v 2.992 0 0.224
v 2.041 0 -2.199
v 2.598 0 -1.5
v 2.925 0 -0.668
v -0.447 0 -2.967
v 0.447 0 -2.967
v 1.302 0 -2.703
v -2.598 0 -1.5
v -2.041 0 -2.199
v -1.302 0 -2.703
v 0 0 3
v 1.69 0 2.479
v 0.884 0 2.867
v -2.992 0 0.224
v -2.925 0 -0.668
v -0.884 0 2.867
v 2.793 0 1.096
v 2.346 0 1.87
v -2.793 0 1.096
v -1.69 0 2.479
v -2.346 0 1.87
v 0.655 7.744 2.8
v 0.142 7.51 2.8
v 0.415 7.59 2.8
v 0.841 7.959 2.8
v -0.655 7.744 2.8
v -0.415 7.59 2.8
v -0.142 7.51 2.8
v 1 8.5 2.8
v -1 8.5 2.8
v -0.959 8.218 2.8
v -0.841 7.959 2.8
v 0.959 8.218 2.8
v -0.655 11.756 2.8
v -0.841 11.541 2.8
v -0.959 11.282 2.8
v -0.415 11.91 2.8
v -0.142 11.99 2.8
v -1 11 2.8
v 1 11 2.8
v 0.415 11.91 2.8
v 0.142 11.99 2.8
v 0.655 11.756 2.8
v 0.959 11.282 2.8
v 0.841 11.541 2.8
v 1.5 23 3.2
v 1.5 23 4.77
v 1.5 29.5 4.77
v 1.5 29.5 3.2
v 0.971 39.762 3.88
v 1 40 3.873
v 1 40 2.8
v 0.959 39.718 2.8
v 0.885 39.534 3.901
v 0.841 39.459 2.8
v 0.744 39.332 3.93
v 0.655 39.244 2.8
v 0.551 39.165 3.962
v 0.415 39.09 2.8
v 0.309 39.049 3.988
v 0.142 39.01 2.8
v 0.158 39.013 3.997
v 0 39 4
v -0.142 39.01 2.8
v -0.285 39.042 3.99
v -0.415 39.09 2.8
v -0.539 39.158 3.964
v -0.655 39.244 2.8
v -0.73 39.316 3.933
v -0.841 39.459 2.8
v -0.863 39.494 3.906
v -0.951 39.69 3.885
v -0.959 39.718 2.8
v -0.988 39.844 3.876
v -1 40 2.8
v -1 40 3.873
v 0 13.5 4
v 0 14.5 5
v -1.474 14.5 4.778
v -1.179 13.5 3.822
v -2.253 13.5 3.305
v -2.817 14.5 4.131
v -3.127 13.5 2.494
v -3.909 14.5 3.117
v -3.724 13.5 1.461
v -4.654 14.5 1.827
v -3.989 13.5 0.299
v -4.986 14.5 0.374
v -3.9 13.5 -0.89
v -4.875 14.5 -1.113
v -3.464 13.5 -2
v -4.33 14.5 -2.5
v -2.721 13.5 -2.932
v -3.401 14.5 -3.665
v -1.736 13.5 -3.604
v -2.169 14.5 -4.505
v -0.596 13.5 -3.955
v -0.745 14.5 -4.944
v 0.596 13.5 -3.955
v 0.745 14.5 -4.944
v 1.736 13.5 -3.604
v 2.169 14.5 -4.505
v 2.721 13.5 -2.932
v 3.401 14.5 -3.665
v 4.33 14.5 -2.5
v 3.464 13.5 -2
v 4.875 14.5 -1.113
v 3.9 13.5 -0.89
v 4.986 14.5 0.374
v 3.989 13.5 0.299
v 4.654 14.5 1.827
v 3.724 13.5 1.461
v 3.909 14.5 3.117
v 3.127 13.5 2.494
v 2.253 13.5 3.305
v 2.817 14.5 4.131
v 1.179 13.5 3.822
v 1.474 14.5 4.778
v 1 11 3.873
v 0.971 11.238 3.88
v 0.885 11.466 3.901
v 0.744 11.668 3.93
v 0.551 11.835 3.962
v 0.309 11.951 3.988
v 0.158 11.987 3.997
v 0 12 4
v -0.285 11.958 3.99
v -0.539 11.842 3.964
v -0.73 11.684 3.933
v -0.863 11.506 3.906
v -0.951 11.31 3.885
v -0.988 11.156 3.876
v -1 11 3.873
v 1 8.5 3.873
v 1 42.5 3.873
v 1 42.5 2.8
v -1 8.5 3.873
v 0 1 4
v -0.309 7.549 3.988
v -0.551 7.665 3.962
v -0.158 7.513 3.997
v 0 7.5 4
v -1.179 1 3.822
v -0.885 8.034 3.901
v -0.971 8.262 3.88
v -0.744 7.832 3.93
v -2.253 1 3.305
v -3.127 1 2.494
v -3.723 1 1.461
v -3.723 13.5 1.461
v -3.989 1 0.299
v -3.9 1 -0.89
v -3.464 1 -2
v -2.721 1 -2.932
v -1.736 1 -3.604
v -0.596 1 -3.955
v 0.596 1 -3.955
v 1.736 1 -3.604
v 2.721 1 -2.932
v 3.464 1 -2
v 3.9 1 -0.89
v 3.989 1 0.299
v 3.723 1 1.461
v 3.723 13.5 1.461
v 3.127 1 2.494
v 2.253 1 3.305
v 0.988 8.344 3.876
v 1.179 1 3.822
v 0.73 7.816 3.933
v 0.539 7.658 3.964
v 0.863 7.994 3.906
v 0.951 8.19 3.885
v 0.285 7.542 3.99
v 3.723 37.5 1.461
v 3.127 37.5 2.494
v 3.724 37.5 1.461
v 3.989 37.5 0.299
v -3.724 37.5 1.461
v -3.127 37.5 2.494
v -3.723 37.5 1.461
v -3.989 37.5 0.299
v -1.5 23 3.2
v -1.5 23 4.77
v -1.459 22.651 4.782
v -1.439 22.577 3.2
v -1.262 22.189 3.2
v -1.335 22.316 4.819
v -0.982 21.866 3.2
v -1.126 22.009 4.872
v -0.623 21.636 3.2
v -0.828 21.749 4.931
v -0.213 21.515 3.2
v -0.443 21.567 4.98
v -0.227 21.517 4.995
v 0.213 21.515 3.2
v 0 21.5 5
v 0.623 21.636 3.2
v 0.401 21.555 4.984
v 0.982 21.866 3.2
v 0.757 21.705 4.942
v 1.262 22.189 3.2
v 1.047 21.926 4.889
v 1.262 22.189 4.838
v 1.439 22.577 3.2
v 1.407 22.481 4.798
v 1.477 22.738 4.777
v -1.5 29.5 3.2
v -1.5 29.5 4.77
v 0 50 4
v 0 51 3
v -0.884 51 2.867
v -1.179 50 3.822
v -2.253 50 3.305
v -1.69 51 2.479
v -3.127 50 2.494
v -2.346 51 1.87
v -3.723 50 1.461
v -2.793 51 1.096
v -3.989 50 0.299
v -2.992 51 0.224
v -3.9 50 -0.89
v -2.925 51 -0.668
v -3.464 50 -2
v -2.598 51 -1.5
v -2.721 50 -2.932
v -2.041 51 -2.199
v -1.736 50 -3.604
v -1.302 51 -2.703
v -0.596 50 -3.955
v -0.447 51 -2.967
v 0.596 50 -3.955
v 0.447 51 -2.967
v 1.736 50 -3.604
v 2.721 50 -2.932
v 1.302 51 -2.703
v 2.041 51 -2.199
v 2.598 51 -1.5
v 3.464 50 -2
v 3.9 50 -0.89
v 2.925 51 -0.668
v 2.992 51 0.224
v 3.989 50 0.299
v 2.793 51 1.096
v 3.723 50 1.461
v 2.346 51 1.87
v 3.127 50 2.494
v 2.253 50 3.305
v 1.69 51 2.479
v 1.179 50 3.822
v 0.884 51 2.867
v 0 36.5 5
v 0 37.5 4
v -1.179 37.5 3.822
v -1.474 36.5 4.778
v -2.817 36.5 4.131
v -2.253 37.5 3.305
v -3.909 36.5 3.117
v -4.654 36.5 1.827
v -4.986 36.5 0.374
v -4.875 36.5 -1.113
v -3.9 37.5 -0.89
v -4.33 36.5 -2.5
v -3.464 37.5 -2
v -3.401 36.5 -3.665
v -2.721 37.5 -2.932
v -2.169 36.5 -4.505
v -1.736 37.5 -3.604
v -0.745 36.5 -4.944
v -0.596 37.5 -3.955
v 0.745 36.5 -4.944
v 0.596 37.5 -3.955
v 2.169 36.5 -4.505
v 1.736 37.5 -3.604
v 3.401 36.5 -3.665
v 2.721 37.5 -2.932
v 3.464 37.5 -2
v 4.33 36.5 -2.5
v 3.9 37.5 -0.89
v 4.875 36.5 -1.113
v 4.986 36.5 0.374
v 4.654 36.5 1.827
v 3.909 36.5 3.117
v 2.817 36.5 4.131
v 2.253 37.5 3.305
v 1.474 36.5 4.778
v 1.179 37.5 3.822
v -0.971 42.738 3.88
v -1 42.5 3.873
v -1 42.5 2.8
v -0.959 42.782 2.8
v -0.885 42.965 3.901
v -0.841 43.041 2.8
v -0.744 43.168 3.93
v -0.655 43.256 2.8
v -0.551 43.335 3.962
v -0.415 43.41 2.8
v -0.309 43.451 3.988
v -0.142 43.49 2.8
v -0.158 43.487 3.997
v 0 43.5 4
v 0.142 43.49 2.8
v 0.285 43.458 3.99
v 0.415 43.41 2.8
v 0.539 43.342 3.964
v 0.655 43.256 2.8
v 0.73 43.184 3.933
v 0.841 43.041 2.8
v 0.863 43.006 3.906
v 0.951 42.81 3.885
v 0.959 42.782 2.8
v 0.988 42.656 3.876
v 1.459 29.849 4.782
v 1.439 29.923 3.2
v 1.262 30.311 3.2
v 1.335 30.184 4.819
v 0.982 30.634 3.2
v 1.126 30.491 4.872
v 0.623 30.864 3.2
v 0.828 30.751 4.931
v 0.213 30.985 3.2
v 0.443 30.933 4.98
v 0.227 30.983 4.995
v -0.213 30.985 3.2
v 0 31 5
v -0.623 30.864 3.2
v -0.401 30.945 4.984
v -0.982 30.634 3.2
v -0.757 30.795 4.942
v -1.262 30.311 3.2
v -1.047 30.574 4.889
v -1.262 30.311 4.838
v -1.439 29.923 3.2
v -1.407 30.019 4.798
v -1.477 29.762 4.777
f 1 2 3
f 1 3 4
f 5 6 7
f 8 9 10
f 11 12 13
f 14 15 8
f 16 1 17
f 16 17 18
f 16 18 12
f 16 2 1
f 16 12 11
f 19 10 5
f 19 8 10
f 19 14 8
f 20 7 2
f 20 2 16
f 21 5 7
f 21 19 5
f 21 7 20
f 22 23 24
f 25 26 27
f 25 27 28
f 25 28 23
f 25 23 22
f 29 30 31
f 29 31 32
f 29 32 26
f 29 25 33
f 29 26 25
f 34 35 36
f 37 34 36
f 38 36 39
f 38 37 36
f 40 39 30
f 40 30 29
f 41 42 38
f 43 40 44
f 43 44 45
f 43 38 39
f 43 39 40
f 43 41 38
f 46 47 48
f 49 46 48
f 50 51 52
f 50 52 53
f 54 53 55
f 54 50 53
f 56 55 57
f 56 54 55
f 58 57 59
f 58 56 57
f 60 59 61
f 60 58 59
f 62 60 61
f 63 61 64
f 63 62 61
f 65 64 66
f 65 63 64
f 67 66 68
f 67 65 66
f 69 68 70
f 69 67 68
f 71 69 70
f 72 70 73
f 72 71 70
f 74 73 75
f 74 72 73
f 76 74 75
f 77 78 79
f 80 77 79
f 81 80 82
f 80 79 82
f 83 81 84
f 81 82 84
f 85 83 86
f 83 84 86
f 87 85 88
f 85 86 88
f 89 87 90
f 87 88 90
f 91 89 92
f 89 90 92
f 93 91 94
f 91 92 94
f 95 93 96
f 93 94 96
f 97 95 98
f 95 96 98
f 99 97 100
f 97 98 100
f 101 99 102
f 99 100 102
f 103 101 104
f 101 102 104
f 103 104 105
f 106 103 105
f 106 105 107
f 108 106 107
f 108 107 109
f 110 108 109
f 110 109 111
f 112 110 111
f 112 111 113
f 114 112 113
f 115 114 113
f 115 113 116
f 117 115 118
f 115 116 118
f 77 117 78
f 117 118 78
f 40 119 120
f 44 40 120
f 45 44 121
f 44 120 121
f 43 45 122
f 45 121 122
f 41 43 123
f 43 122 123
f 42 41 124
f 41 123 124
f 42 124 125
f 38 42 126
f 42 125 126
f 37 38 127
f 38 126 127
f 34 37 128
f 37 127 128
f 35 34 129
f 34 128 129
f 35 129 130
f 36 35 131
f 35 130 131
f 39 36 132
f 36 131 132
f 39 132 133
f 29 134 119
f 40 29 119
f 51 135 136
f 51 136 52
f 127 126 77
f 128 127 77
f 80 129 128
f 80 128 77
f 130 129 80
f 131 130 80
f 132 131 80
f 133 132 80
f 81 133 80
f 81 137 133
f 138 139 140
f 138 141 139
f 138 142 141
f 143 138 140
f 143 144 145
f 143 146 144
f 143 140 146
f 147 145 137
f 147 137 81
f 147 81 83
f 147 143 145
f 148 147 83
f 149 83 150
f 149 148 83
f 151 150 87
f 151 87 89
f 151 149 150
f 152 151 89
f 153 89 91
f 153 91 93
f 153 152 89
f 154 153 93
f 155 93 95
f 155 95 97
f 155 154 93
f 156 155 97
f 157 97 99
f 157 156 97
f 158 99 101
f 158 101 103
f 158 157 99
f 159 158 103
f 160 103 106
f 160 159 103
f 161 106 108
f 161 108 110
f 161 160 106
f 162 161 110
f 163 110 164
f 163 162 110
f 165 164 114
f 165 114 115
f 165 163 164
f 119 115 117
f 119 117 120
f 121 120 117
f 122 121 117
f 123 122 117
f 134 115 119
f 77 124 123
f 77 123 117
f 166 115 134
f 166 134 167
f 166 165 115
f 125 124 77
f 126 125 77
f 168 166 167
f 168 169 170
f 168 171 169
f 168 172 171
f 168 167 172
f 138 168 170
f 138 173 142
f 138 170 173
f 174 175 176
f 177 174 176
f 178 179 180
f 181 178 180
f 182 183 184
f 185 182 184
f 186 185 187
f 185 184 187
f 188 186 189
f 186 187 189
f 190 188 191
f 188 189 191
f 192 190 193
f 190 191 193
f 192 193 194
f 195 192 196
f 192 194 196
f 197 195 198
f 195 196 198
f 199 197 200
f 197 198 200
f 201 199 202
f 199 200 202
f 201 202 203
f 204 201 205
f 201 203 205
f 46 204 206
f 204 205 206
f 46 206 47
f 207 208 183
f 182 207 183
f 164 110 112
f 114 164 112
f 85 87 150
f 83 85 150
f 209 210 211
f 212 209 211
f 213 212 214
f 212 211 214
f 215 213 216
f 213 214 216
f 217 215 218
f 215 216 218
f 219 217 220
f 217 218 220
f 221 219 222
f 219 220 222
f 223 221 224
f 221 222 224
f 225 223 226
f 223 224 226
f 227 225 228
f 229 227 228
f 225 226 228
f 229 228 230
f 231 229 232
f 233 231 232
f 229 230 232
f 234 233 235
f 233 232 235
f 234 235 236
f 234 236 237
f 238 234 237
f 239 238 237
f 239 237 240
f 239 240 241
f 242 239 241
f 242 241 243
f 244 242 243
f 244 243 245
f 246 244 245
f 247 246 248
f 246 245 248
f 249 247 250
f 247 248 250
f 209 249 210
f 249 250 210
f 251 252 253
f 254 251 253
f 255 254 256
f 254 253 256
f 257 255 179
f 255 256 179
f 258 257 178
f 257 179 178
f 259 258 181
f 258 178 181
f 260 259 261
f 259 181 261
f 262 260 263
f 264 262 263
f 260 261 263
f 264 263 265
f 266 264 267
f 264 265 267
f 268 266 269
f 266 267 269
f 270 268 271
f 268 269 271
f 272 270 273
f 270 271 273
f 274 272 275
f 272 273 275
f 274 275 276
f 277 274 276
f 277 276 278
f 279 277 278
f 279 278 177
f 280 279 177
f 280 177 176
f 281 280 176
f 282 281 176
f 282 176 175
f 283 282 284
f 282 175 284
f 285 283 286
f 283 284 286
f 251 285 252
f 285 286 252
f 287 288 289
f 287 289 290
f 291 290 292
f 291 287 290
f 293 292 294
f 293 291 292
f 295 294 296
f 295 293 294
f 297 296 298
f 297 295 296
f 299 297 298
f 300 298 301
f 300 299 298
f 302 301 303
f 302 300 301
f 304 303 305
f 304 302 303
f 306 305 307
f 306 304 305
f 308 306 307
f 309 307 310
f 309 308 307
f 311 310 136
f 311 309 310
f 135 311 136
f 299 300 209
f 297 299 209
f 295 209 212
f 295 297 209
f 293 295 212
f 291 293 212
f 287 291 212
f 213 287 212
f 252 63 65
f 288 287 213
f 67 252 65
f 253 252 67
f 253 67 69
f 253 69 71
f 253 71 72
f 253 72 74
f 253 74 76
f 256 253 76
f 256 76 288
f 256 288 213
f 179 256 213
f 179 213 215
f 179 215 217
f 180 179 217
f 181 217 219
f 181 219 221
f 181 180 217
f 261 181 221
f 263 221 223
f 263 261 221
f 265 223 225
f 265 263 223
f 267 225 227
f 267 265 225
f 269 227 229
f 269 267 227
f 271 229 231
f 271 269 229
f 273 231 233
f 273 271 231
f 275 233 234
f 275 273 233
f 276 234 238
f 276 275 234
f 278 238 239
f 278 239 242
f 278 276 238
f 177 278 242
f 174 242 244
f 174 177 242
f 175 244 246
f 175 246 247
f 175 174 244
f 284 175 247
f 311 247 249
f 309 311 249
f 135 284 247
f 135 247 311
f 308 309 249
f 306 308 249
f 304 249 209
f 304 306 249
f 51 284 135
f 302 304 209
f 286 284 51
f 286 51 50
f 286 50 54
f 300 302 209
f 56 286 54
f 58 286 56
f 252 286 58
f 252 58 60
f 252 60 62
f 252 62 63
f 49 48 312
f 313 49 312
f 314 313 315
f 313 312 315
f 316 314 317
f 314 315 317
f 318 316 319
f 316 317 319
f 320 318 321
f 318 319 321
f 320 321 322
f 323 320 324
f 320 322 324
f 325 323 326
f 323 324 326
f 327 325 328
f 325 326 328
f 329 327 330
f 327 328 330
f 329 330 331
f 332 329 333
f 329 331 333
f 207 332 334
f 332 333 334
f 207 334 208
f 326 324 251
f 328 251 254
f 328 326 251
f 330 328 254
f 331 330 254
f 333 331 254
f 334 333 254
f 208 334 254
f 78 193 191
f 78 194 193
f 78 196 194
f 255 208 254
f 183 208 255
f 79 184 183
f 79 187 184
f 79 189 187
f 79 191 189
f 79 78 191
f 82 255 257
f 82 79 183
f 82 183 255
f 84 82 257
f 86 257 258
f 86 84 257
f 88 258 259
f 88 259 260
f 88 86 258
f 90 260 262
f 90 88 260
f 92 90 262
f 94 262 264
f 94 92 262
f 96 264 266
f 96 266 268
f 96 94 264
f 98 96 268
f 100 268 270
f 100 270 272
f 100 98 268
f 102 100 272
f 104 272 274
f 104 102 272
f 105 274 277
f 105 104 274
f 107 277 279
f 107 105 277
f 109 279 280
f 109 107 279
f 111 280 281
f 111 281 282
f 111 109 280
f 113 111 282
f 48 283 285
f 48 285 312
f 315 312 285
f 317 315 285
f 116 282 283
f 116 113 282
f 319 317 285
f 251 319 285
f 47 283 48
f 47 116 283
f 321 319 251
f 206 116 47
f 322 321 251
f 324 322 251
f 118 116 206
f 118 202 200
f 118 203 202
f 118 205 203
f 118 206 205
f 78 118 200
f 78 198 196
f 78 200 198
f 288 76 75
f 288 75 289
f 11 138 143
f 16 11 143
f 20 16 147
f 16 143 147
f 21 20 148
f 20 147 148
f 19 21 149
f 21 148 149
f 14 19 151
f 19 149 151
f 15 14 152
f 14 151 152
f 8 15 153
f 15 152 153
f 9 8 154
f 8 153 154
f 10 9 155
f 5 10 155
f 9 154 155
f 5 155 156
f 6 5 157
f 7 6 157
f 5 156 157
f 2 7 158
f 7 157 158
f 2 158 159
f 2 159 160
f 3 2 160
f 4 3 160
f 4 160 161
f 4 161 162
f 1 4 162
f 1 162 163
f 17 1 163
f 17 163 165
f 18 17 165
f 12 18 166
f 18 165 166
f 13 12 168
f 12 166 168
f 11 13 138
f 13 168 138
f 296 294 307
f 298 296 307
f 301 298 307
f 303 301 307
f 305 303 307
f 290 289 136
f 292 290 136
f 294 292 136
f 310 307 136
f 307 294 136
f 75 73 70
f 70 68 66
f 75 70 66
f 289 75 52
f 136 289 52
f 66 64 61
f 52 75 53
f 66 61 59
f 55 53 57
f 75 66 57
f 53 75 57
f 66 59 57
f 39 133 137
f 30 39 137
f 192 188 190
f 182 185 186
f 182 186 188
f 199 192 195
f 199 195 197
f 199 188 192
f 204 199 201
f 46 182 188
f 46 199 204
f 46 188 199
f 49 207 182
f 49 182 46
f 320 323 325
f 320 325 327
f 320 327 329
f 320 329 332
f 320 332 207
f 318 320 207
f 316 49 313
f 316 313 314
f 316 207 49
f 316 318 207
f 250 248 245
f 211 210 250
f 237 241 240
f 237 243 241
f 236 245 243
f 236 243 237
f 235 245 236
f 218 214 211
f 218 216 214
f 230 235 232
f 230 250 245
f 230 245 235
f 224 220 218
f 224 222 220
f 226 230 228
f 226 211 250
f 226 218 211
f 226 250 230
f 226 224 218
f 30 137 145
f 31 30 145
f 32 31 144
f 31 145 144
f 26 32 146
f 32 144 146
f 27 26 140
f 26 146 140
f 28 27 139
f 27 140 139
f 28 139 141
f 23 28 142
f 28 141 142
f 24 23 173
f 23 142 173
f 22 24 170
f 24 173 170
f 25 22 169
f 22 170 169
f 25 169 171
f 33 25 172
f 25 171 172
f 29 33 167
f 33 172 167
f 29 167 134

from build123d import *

# Parameters (mm, degrees)
F6_DEPTH  = 1.2
F7_SIZE   = 0.99999
F11_DEPTH = 1.8


# Not quite as in the source:
# - a fillet or chamfer is up to 0.001 mm smaller than in the source, because OpenCascade refuses the exact size
# - a pattern or mirror of a feature is missing from the dataset's text; its kind, count and spacing are read off the source's solid


with BuildPart() as f1:
    # F0 (on Right) → F1 (revolve)
    with BuildSketch(Plane.YZ):
        Polygon((0, 4), (0, 0), (51, 0), (51, 4), (37.5, 4), (37.5, 5), (13.5, 5), (13.5, 4), align=None)
    revolve(axis=Axis((0, 25.5, 0), (0, -1, 0)))

    # F5 (on offset) → F6 (cut)
    with BuildSketch(Plane.XY.offset(4)):
        with BuildLine():
            Line((1, 8.5), (1, 11))
            ThreePointArc((1, 11), (0, 12), (-1, 11))
            Line((-1, 11), (-1, 8.5))
            ThreePointArc((-1, 8.5), (0, 7.5), (1, 8.5))
        make_face()
    f6 = extrude(amount=-F6_DEPTH, mode=Mode.SUBTRACT)

    # F6_copies: F6 across plane
    add(f6.mirror(Plane(origin=(-1e-06, 25.499997, -1e-06), x_dir=(0, 0, 1), z_dir=(0, 1, 0))), mode=Mode.SUBTRACT)

    # F7 (size 1 in the source; OpenCascade refuses exactly that, so slightly less here)
    f7_edges = [f1.edges().sort_by_distance(p)[0] for p in [
        (0, 13.5, -5),
        (0, 37.5, -5),
        (0, 51, -4),
        (0, 0, -4),
    ]]
    chamfer(f7_edges, length=F7_SIZE)

    # F10 (on offset) → F11 (cut)
    with BuildSketch(Plane.XY.offset(5)):
        with BuildLine():
            Line((1.5, 23), (1.5, 29.5))
            ThreePointArc((1.5, 29.5), (0, 31), (-1.5, 29.5))
            Line((-1.5, 29.5), (-1.5, 23))
            ThreePointArc((-1.5, 23), (0, 21.5), (1.5, 23))
        make_face()
    extrude(amount=-F11_DEPTH, mode=Mode.SUBTRACT)


solid = f1.part
